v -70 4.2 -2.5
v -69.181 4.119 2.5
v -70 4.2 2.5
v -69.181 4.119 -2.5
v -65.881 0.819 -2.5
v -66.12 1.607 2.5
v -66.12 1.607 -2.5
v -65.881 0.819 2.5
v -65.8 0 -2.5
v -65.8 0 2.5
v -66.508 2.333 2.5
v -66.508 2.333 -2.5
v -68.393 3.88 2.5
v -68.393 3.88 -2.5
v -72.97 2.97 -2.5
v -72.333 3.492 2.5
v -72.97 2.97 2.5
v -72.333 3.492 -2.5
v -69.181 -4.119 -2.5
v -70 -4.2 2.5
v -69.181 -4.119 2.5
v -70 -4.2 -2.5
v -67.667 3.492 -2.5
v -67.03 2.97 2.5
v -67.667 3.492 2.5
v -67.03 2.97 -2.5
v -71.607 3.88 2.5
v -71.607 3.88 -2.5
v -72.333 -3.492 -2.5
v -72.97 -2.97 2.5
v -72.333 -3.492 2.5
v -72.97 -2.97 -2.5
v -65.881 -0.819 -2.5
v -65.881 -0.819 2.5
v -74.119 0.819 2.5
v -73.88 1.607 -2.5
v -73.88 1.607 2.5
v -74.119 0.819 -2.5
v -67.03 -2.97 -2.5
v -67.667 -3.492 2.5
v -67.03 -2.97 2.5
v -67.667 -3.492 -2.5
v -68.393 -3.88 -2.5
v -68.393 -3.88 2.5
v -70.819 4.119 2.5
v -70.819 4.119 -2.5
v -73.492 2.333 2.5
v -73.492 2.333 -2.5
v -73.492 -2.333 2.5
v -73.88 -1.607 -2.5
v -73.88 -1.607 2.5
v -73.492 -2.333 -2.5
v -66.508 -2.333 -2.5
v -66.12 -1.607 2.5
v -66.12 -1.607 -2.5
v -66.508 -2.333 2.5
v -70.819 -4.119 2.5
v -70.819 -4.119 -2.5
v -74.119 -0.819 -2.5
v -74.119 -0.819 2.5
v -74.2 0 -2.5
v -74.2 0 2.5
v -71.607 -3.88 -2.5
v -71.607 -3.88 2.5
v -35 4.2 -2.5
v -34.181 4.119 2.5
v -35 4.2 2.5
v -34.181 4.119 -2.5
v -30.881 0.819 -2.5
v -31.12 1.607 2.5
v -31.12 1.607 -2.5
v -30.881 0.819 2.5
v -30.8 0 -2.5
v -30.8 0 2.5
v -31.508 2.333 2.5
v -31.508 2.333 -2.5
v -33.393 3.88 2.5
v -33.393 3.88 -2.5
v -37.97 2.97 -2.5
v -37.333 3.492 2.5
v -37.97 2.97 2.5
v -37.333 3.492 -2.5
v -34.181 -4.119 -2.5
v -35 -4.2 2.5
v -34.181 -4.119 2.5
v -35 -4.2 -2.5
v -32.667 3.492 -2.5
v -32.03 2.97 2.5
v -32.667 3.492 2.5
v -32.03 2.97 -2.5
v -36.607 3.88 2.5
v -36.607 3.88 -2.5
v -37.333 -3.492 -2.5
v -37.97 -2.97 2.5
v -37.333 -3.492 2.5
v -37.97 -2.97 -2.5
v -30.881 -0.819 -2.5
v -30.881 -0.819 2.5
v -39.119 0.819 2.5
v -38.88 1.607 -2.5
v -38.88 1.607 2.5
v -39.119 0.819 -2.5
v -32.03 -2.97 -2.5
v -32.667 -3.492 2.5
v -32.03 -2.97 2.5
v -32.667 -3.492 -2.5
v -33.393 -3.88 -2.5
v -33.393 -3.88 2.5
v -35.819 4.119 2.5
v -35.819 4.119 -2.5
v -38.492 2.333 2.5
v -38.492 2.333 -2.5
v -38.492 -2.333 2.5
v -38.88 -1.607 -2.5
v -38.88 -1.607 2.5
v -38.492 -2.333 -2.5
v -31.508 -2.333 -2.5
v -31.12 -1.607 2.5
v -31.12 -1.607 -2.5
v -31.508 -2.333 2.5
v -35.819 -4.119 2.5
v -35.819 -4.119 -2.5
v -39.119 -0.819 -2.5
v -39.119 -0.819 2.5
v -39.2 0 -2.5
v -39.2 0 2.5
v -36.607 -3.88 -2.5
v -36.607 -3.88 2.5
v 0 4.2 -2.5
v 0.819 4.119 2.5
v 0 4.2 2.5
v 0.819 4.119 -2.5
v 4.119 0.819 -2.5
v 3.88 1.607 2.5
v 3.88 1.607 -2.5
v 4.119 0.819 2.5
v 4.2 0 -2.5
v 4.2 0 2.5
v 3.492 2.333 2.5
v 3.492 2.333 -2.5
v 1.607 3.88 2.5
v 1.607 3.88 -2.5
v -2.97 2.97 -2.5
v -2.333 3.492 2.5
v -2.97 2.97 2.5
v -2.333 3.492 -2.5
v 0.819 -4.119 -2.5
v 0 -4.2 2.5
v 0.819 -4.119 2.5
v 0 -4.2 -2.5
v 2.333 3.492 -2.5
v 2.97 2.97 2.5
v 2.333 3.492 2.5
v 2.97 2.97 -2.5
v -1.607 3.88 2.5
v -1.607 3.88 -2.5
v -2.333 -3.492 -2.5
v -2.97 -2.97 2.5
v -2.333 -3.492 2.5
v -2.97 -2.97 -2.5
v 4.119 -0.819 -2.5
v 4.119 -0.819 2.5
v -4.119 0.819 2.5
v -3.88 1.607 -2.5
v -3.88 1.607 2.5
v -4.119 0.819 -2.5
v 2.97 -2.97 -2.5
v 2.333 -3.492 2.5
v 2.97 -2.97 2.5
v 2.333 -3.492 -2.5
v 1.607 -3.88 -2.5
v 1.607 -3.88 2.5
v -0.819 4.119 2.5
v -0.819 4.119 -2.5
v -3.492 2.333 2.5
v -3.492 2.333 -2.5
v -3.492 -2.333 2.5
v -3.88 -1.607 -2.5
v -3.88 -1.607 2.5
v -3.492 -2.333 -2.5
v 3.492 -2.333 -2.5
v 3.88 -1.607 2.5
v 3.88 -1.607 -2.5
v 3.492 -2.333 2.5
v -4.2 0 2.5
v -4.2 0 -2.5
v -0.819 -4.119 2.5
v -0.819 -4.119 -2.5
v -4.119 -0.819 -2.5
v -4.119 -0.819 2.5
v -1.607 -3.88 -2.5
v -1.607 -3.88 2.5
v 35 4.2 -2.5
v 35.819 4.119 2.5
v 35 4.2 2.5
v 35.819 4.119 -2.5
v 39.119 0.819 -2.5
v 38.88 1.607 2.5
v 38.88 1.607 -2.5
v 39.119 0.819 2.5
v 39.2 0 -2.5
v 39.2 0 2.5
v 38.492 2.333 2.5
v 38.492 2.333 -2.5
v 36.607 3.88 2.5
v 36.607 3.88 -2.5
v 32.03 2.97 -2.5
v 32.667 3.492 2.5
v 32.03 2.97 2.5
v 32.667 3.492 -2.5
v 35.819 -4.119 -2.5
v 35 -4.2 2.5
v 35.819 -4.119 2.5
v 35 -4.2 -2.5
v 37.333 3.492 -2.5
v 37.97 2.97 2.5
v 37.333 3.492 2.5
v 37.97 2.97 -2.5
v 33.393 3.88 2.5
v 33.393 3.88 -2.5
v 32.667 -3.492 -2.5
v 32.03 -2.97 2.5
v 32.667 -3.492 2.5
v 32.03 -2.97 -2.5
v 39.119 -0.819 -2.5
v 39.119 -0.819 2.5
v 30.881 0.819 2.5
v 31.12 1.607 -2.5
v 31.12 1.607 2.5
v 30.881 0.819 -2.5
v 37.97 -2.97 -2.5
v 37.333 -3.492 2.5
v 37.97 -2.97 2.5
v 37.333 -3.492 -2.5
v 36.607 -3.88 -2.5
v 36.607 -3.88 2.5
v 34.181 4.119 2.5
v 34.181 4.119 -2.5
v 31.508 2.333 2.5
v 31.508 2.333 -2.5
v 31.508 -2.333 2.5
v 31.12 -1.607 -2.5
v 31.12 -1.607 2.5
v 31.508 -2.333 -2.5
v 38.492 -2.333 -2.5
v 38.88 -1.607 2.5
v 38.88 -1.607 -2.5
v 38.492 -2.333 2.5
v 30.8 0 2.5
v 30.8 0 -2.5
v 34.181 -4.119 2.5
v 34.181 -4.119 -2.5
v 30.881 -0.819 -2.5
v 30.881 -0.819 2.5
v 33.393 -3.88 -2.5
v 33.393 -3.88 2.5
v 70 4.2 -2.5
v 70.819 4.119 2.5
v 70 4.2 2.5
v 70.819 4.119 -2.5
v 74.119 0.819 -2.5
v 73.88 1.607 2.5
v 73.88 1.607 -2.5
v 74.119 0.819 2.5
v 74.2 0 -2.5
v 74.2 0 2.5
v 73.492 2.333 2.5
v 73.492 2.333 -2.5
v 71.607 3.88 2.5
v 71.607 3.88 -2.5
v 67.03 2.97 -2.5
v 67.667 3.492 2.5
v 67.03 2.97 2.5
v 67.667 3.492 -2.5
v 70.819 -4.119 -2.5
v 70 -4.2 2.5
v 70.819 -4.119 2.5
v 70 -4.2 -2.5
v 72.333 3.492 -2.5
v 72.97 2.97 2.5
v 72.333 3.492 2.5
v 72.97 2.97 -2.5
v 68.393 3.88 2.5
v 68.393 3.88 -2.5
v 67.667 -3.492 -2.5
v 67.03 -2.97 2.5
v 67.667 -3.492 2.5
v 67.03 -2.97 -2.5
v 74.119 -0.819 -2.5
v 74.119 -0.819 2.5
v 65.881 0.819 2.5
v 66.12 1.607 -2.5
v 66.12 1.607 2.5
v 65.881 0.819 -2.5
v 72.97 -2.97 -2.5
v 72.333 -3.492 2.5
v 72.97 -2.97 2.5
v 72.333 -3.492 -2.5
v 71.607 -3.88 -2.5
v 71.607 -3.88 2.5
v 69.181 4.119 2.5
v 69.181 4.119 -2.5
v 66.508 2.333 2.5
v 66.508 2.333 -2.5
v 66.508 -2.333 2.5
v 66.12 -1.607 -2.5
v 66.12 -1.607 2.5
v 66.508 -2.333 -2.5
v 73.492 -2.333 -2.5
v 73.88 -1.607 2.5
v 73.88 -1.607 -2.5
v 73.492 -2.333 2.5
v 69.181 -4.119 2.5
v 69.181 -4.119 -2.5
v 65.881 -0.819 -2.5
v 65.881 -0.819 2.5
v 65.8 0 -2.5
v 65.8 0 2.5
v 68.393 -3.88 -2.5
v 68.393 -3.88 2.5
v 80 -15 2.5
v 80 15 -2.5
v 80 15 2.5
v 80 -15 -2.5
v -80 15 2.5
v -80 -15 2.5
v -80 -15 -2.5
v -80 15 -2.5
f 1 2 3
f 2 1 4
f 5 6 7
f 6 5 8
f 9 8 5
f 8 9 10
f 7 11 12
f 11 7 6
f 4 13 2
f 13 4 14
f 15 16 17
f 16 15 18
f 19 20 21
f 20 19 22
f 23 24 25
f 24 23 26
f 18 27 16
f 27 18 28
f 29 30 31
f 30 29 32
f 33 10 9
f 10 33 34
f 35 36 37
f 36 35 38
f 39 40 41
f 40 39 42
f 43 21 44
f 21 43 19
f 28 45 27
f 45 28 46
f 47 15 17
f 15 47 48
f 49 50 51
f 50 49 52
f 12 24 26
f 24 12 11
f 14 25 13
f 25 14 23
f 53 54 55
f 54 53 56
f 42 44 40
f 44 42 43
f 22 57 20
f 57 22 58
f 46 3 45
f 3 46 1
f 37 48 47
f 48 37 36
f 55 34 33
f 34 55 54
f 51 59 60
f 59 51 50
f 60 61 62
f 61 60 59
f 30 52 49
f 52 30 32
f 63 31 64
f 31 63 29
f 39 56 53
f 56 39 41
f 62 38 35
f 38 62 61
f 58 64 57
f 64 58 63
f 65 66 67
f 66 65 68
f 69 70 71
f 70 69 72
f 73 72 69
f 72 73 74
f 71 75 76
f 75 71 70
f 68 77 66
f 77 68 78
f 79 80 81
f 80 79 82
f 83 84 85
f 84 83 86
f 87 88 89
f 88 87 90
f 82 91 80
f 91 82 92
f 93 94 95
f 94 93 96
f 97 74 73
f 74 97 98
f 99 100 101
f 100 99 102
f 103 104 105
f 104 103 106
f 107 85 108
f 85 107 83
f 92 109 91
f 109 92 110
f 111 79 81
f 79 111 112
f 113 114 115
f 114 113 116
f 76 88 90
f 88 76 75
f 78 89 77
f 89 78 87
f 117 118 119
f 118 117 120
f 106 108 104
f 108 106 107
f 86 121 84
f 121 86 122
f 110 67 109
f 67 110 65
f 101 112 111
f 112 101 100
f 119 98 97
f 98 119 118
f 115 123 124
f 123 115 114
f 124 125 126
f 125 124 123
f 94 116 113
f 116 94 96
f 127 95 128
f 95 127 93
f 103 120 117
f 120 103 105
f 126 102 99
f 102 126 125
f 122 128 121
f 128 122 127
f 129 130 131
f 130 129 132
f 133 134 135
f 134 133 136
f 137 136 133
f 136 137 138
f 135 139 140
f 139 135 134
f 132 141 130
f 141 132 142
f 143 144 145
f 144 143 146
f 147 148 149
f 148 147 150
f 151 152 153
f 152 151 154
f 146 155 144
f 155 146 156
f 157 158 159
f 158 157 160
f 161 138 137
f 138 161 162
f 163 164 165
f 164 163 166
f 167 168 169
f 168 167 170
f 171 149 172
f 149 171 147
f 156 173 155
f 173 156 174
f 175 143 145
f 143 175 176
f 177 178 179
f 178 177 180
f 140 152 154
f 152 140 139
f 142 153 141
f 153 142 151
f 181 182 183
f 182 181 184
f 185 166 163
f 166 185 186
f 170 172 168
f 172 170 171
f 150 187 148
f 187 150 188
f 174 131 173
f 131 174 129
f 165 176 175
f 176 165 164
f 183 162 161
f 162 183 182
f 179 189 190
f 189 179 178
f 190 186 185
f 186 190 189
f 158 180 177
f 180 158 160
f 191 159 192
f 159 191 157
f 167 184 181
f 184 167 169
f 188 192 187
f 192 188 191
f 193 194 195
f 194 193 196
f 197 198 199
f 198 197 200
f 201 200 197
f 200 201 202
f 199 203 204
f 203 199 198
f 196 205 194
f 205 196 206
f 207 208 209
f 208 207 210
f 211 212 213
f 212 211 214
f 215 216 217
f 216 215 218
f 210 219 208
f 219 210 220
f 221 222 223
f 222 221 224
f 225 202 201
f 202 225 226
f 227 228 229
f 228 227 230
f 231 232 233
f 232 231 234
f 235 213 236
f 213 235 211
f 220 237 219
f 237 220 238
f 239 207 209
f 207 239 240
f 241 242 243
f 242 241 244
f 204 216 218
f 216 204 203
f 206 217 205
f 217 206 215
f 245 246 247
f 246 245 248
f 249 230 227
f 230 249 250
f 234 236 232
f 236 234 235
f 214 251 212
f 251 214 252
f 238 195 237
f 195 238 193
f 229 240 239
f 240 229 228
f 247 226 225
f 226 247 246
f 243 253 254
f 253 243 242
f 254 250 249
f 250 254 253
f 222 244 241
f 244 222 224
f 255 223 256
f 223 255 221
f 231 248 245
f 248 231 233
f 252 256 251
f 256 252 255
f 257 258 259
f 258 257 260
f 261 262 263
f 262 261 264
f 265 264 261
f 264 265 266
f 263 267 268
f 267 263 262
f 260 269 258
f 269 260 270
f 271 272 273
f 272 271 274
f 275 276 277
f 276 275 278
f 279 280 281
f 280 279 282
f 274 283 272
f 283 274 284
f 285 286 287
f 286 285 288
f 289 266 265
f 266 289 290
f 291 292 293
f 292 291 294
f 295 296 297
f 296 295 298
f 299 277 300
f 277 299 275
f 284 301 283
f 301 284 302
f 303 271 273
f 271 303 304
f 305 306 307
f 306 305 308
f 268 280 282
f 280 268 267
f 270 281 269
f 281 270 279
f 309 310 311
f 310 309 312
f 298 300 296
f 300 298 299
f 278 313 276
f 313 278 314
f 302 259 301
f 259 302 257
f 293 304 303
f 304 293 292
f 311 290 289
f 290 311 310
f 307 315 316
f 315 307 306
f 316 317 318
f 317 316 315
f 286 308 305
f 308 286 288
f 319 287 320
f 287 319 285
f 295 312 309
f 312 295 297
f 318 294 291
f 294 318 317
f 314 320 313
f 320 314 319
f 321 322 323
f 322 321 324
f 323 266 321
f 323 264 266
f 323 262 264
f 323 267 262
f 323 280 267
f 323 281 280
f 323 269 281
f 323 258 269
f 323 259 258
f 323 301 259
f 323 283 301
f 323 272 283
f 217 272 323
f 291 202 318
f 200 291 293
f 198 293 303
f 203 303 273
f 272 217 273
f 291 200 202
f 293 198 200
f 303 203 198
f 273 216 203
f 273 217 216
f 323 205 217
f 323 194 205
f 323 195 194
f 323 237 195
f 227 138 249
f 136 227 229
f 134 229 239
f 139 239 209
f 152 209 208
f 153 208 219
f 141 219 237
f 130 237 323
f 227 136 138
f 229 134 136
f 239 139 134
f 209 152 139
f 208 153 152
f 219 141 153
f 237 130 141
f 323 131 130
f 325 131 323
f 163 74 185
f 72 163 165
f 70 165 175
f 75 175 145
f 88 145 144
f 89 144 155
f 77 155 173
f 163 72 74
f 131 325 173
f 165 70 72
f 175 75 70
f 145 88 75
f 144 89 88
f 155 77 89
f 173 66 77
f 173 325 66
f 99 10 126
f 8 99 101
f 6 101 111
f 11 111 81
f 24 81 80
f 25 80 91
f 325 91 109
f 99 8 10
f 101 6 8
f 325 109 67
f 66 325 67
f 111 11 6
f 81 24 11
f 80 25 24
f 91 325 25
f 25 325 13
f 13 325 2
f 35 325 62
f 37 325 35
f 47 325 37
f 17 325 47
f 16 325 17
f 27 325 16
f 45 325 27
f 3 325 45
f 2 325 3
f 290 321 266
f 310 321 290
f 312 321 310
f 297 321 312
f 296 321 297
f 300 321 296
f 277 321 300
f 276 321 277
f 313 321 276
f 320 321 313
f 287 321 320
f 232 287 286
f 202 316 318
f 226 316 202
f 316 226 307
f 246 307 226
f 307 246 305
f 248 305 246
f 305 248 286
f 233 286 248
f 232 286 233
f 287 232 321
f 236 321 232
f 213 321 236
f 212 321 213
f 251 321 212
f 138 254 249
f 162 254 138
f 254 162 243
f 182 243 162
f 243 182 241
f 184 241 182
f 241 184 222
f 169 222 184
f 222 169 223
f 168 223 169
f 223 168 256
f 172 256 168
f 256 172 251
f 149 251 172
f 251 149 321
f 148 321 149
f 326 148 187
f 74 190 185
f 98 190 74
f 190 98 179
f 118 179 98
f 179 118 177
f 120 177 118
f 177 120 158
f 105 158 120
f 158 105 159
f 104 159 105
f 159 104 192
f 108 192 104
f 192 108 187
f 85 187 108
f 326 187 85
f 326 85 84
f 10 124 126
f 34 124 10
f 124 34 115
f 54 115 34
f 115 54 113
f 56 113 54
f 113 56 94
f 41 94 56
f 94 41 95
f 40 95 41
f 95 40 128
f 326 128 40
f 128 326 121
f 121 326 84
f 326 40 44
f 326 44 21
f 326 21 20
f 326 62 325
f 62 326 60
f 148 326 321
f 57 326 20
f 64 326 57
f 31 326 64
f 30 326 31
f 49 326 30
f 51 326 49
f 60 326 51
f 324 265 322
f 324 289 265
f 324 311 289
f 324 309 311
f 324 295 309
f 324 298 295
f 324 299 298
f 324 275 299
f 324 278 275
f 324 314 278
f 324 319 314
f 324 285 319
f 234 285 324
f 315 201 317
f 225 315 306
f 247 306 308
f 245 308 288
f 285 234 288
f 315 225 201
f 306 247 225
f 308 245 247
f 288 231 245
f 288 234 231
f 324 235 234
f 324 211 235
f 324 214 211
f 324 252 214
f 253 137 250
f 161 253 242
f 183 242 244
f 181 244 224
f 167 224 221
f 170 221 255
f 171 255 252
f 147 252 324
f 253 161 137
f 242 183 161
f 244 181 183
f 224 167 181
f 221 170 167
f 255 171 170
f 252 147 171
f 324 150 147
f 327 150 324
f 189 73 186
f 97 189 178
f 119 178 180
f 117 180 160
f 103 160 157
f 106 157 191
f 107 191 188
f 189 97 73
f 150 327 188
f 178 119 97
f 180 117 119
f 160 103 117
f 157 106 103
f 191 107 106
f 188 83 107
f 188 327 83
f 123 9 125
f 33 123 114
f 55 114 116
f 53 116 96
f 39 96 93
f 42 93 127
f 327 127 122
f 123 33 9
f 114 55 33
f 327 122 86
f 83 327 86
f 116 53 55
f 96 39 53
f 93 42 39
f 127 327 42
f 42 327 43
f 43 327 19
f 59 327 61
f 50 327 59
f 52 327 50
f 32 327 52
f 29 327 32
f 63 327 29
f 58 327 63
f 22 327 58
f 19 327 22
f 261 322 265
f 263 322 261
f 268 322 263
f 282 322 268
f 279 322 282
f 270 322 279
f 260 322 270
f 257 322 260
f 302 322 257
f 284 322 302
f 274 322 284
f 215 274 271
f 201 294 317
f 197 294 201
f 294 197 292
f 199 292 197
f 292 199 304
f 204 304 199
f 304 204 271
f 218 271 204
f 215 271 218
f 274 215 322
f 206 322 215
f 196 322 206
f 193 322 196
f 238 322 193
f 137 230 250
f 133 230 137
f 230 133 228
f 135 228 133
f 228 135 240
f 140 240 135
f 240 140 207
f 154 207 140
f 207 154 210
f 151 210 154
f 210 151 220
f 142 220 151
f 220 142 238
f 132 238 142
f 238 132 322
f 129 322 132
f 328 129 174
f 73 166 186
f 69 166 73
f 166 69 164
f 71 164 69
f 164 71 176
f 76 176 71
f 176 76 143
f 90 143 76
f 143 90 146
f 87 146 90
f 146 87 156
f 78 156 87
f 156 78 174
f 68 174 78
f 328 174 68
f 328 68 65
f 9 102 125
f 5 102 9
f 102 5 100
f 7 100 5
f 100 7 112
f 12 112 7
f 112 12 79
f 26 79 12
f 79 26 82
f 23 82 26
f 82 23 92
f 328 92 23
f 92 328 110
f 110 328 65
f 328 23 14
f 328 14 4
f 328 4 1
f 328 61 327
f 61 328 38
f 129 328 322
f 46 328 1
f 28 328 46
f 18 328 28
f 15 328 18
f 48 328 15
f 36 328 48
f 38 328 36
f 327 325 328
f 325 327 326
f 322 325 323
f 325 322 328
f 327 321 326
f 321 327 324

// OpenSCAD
$fn = 32;

// ----------------------------------------------------------------------
// Hole bar, 5 x Ø8.4
// row layout, 10 mm edge offset
// ----------------------------------------------------------------------

// --- parameters (mm) ---
bar_w = 30;    // bar width (Y)
bar_t = 5;     // bar thickness (Z)
holes = 5;     // holes per row
hole_d = 8.4;  // hole diameter
edge = 10;     // offset from the bar end to the first hole
pitch = 35;    // pitch between neighbouring holes

// --- derived feature positions (mm) ---
span = (holes - 1) * pitch;   // = 140   distance between the end holes
bar_l = span + 2 * edge;      // = 160   overall bar length
start_x = -bar_l / 2 + edge;  // = -70   X of the first hole
feature_centers = [
  [start_x + 0 * pitch, 0],
  [start_x + 1 * pitch, 0],
  [start_x + 2 * pitch, 0],
  [start_x + 3 * pitch, 0],
  [start_x + 4 * pitch, 0]
];   // hole centres of the first row

// bar with one row of holes, drilled from feature_centers
difference() {
  translate([-bar_l / 2, -bar_w / 2, -bar_t / 2]) cube([bar_l, bar_w, bar_t]);
  for (centre = feature_centers)
    translate([centre[0], centre[1], 0])
      cylinder(d = hole_d, h = bar_t + 2, center = true);
}
